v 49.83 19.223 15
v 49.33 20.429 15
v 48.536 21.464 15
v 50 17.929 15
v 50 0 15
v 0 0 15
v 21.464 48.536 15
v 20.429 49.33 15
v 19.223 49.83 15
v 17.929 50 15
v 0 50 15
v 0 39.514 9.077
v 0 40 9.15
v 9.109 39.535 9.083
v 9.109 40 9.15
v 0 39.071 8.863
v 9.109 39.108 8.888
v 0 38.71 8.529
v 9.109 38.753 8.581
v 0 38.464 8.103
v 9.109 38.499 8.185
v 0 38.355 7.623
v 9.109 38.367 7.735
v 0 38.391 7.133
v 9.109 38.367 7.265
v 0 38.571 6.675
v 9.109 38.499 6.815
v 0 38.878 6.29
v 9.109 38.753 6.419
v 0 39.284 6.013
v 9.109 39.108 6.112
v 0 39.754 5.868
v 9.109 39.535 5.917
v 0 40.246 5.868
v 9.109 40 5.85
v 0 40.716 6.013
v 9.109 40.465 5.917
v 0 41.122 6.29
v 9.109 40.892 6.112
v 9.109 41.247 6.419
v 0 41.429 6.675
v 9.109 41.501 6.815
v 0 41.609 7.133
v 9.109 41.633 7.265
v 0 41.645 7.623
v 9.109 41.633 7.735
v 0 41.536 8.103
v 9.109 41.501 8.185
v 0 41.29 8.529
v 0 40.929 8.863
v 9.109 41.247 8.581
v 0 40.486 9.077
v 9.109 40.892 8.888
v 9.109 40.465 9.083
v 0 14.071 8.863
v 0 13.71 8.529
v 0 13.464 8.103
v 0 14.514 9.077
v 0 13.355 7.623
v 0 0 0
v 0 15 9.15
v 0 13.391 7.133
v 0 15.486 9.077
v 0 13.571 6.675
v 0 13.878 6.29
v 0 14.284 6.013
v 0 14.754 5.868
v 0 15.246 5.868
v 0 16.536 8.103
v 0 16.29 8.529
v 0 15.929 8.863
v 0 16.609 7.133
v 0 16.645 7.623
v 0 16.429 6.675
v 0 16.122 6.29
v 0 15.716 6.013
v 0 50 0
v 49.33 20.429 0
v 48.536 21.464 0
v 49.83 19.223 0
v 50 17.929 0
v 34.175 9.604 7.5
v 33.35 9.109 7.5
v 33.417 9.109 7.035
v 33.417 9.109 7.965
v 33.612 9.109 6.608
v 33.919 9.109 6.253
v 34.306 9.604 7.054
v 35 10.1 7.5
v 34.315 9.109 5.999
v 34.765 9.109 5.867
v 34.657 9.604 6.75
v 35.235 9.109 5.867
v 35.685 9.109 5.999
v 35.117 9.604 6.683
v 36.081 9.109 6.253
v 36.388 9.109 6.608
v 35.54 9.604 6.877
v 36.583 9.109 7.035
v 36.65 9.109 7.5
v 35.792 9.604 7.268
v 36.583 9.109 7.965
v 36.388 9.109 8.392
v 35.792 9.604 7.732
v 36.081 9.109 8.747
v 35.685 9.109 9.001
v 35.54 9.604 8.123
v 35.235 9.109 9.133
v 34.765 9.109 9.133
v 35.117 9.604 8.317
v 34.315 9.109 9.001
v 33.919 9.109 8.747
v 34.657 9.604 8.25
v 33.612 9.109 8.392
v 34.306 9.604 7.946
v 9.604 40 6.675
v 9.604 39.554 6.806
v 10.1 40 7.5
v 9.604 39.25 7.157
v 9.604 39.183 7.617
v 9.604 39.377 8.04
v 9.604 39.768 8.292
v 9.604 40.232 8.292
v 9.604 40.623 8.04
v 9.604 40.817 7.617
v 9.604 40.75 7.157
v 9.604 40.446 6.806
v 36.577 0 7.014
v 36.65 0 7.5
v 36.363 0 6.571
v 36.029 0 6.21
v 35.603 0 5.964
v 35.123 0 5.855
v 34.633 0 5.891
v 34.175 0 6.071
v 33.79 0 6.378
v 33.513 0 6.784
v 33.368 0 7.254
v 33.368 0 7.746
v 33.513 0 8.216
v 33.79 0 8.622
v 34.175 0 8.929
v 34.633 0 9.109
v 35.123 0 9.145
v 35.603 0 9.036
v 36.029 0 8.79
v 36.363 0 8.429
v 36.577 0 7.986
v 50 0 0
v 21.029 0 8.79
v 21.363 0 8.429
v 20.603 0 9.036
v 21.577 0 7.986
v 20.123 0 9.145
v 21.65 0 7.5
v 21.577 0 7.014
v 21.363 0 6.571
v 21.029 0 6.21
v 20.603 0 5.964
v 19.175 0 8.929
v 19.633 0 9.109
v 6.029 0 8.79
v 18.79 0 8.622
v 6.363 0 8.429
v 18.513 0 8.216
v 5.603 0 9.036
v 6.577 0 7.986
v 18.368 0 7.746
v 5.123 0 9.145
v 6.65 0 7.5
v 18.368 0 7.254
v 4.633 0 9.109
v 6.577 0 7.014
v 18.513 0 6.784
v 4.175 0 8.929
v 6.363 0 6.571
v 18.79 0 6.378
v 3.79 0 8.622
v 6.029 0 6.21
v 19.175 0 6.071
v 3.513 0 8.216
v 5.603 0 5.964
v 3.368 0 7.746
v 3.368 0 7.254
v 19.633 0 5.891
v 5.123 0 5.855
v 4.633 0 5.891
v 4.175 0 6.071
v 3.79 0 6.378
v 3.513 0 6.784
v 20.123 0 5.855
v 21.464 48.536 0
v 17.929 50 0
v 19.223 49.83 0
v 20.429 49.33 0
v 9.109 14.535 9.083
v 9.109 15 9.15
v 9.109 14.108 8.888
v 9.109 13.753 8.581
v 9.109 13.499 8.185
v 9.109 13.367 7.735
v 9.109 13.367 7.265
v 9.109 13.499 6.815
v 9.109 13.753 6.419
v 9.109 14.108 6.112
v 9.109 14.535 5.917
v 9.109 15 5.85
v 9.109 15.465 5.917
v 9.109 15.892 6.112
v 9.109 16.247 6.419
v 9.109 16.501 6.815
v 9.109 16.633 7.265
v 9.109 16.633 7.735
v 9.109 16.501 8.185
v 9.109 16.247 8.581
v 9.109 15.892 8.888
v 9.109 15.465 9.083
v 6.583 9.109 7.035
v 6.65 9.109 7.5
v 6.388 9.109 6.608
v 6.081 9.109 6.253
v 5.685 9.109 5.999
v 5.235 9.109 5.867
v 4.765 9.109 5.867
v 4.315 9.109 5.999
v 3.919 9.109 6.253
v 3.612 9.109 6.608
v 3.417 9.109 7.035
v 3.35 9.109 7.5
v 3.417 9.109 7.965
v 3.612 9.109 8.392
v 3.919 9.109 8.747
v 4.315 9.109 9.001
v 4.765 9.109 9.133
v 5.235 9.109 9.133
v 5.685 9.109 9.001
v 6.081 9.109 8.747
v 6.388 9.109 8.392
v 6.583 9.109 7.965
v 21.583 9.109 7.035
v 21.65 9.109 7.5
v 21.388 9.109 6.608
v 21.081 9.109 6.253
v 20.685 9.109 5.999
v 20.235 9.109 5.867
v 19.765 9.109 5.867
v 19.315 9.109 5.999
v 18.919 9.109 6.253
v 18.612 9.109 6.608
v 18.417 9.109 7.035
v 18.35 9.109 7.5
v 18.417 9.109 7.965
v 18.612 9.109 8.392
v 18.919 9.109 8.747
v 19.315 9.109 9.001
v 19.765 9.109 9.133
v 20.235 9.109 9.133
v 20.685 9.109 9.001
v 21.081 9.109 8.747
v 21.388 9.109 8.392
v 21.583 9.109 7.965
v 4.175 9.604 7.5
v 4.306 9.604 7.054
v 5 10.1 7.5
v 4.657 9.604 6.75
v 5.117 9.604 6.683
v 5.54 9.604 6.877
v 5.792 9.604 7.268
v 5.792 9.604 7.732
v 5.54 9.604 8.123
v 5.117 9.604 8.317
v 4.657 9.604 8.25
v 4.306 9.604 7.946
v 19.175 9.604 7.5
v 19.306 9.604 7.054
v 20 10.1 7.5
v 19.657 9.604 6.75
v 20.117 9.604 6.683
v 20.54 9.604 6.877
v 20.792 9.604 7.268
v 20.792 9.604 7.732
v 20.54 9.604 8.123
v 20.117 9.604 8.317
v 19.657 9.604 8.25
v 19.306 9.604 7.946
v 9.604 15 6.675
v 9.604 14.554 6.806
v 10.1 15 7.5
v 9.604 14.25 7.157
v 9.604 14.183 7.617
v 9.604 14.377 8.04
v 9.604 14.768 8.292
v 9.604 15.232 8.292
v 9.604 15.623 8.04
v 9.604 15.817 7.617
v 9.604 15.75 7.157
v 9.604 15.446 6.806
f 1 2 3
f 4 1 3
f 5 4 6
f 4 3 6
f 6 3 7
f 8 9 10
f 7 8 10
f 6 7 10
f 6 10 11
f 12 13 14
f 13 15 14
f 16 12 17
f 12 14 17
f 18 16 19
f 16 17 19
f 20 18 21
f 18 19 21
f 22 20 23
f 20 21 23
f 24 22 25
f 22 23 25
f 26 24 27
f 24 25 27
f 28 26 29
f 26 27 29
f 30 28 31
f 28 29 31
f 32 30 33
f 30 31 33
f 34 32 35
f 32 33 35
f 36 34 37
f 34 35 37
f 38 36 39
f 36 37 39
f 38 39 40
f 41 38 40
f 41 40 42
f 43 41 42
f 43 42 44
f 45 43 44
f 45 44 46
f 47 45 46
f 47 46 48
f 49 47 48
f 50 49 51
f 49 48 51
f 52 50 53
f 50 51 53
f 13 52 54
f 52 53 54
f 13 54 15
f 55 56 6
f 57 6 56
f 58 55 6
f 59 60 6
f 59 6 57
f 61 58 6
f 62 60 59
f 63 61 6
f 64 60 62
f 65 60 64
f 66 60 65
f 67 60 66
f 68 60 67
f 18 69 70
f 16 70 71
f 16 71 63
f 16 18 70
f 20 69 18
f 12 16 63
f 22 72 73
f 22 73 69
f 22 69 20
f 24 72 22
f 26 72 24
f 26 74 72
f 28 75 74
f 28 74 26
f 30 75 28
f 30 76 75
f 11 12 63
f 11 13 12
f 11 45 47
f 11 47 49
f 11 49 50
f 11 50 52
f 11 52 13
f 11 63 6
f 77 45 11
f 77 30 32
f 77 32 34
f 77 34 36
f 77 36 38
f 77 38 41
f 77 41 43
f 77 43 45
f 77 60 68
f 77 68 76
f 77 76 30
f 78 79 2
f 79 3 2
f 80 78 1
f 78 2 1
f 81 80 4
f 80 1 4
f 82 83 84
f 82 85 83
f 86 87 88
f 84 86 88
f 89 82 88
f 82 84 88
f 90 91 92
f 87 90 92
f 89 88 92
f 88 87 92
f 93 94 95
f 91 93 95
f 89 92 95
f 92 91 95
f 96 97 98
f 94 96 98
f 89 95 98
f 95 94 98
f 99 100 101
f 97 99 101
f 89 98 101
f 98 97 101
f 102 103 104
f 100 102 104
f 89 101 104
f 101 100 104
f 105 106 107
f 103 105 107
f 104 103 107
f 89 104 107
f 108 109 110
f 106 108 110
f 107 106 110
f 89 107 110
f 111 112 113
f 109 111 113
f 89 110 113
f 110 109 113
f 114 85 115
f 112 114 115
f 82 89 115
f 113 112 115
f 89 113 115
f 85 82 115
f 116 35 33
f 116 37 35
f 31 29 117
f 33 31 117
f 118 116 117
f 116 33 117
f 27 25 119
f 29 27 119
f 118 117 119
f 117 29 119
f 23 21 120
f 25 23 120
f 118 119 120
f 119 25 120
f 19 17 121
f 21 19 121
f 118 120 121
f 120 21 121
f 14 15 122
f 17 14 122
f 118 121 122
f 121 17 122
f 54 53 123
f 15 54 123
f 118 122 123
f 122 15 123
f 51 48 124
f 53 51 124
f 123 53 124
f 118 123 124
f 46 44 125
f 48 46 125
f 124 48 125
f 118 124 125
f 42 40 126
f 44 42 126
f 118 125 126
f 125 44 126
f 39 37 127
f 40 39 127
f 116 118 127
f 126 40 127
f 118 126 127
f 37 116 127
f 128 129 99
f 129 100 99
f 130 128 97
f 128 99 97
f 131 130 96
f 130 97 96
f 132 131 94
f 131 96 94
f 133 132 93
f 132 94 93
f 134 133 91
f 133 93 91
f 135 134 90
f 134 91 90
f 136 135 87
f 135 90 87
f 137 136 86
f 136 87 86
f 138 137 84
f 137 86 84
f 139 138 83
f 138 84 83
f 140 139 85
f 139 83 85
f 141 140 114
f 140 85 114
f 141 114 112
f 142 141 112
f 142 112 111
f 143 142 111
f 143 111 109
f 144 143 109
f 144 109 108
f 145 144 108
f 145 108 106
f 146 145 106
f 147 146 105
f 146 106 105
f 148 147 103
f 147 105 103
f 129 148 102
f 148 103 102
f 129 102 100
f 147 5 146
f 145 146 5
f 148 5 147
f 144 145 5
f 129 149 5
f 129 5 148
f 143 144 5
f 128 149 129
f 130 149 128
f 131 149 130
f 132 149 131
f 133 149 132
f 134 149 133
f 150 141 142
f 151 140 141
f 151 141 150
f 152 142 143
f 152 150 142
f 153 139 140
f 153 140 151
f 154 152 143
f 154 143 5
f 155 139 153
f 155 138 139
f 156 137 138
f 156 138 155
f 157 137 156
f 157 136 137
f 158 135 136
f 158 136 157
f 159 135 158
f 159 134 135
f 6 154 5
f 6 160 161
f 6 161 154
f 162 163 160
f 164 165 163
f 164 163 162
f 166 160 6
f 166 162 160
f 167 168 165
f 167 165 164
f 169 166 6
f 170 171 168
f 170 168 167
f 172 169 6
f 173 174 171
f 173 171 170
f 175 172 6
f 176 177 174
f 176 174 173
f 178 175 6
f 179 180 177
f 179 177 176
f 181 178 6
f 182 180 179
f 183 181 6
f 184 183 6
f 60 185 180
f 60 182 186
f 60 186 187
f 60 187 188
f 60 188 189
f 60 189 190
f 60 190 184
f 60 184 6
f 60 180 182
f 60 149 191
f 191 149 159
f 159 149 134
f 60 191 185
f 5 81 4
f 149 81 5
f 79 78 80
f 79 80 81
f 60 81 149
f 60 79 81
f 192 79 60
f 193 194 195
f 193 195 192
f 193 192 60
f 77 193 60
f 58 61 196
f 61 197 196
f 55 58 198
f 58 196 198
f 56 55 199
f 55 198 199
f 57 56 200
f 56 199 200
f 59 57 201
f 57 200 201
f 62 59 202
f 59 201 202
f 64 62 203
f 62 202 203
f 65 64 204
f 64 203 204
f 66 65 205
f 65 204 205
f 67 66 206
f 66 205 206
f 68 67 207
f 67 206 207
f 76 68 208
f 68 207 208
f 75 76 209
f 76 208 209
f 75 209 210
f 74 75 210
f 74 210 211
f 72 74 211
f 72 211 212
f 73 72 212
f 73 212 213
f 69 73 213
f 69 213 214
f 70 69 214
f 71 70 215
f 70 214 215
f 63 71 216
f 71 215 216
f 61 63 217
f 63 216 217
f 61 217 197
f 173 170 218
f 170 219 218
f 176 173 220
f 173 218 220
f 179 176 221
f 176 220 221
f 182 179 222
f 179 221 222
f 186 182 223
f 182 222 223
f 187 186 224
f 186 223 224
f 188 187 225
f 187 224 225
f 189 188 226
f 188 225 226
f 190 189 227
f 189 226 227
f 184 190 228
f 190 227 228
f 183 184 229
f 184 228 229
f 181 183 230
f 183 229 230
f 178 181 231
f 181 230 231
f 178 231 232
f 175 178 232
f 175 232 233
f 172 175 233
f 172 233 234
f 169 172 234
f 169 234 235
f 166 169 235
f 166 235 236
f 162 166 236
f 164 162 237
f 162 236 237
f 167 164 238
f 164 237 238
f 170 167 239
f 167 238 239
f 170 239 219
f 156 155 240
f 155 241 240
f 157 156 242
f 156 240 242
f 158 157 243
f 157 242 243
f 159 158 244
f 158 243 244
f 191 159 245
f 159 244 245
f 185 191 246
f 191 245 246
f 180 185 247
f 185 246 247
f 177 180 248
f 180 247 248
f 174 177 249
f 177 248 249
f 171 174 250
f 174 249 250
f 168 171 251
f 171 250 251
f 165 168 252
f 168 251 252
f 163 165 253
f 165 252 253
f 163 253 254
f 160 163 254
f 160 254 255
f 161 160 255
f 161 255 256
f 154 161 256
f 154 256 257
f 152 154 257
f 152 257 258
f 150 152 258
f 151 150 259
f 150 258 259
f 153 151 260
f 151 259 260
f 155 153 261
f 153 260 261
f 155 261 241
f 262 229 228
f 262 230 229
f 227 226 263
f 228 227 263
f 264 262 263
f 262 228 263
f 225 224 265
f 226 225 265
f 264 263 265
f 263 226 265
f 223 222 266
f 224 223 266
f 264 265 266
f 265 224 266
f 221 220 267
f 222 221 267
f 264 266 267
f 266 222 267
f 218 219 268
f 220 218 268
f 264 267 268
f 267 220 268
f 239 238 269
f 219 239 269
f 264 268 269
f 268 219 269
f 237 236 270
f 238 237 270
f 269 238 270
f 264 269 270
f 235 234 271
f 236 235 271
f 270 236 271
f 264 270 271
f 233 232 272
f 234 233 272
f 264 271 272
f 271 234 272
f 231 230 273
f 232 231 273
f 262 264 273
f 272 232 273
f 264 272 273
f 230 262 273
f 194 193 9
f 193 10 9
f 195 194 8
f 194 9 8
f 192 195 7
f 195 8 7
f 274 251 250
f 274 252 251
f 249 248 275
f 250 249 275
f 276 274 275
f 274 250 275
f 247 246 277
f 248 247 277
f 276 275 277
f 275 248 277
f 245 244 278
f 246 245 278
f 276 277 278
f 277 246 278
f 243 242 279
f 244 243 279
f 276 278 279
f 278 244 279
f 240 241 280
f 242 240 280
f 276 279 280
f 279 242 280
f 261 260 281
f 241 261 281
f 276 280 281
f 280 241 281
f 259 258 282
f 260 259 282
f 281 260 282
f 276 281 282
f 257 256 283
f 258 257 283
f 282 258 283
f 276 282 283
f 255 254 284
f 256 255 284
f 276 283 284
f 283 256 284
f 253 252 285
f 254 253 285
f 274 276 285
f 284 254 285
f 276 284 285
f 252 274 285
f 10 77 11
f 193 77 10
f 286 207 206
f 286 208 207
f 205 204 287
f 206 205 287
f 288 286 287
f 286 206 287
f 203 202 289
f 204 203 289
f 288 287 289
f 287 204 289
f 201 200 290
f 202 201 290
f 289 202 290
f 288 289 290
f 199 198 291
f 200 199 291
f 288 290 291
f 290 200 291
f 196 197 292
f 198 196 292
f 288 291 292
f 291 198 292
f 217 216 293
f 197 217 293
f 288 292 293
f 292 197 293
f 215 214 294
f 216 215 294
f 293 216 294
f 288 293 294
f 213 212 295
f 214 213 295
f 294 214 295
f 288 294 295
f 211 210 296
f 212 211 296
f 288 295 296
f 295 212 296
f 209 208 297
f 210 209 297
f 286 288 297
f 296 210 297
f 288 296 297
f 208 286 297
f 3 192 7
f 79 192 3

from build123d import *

# Parameters (mm, degrees)
BOSS_EXTRUDE1_DEPTH   = 15
M4_TAPPED_HOLE1_D     = 3.3
M4_TAPPED_HOLE1_DEPTH = 9.108579979
M4_TAPPED_HOLE1_TIP   = 0.991420021
M4_TAPPED_HOLE2_D     = 3.3
M4_TAPPED_HOLE2_DEPTH = 9.108579979
M4_TAPPED_HOLE2_TIP   = 0.991420021
FILLET1_R             = 5


with BuildPart() as part:
    # Sketch1 → Boss-Extrude1 (new body)
    with BuildSketch(Plane.XY):
        Polygon((0, 50), (20, 50), (50, 20), (50, 0), (0, 0), align=None)
    extrude(amount=BOSS_EXTRUDE1_DEPTH)

    # M4 Tapped Hole1
    with Locations(Plane(origin=(0, 40, 7.5), x_dir=(0, 0, -1), z_dir=(-1, 0, 0))):
        with Locations((0, 0), (0, 25)):
            Hole(M4_TAPPED_HOLE1_D / 2, depth=M4_TAPPED_HOLE1_DEPTH)
            with Locations((0, 0, -(M4_TAPPED_HOLE1_DEPTH + M4_TAPPED_HOLE1_TIP / 2))):  # 118° drill point
                Cone(0, M4_TAPPED_HOLE1_D / 2, M4_TAPPED_HOLE1_TIP, mode=Mode.SUBTRACT)

    # M4 Tapped Hole2
    with Locations(Plane(origin=(0, 0, 0), x_dir=(-1, 0, 0), z_dir=(0, -1, 0))):
        with Locations((-35, -7.5), (-20, -7.5), (-5, -7.5)):
            Hole(M4_TAPPED_HOLE2_D / 2, depth=M4_TAPPED_HOLE2_DEPTH)
            with Locations((0, 0, -(M4_TAPPED_HOLE2_DEPTH + M4_TAPPED_HOLE2_TIP / 2))):  # 118° drill point
                Cone(0, M4_TAPPED_HOLE2_D / 2, M4_TAPPED_HOLE2_TIP, mode=Mode.SUBTRACT)

    # Fillet1
    fillet1_edges = [part.edges().sort_by_distance(p)[0] for p in [
        (20, 50, 7.5),
        (50, 20, 7.5),
    ]]
    fillet(fillet1_edges, radius=FILLET1_R)


solid = part.part
